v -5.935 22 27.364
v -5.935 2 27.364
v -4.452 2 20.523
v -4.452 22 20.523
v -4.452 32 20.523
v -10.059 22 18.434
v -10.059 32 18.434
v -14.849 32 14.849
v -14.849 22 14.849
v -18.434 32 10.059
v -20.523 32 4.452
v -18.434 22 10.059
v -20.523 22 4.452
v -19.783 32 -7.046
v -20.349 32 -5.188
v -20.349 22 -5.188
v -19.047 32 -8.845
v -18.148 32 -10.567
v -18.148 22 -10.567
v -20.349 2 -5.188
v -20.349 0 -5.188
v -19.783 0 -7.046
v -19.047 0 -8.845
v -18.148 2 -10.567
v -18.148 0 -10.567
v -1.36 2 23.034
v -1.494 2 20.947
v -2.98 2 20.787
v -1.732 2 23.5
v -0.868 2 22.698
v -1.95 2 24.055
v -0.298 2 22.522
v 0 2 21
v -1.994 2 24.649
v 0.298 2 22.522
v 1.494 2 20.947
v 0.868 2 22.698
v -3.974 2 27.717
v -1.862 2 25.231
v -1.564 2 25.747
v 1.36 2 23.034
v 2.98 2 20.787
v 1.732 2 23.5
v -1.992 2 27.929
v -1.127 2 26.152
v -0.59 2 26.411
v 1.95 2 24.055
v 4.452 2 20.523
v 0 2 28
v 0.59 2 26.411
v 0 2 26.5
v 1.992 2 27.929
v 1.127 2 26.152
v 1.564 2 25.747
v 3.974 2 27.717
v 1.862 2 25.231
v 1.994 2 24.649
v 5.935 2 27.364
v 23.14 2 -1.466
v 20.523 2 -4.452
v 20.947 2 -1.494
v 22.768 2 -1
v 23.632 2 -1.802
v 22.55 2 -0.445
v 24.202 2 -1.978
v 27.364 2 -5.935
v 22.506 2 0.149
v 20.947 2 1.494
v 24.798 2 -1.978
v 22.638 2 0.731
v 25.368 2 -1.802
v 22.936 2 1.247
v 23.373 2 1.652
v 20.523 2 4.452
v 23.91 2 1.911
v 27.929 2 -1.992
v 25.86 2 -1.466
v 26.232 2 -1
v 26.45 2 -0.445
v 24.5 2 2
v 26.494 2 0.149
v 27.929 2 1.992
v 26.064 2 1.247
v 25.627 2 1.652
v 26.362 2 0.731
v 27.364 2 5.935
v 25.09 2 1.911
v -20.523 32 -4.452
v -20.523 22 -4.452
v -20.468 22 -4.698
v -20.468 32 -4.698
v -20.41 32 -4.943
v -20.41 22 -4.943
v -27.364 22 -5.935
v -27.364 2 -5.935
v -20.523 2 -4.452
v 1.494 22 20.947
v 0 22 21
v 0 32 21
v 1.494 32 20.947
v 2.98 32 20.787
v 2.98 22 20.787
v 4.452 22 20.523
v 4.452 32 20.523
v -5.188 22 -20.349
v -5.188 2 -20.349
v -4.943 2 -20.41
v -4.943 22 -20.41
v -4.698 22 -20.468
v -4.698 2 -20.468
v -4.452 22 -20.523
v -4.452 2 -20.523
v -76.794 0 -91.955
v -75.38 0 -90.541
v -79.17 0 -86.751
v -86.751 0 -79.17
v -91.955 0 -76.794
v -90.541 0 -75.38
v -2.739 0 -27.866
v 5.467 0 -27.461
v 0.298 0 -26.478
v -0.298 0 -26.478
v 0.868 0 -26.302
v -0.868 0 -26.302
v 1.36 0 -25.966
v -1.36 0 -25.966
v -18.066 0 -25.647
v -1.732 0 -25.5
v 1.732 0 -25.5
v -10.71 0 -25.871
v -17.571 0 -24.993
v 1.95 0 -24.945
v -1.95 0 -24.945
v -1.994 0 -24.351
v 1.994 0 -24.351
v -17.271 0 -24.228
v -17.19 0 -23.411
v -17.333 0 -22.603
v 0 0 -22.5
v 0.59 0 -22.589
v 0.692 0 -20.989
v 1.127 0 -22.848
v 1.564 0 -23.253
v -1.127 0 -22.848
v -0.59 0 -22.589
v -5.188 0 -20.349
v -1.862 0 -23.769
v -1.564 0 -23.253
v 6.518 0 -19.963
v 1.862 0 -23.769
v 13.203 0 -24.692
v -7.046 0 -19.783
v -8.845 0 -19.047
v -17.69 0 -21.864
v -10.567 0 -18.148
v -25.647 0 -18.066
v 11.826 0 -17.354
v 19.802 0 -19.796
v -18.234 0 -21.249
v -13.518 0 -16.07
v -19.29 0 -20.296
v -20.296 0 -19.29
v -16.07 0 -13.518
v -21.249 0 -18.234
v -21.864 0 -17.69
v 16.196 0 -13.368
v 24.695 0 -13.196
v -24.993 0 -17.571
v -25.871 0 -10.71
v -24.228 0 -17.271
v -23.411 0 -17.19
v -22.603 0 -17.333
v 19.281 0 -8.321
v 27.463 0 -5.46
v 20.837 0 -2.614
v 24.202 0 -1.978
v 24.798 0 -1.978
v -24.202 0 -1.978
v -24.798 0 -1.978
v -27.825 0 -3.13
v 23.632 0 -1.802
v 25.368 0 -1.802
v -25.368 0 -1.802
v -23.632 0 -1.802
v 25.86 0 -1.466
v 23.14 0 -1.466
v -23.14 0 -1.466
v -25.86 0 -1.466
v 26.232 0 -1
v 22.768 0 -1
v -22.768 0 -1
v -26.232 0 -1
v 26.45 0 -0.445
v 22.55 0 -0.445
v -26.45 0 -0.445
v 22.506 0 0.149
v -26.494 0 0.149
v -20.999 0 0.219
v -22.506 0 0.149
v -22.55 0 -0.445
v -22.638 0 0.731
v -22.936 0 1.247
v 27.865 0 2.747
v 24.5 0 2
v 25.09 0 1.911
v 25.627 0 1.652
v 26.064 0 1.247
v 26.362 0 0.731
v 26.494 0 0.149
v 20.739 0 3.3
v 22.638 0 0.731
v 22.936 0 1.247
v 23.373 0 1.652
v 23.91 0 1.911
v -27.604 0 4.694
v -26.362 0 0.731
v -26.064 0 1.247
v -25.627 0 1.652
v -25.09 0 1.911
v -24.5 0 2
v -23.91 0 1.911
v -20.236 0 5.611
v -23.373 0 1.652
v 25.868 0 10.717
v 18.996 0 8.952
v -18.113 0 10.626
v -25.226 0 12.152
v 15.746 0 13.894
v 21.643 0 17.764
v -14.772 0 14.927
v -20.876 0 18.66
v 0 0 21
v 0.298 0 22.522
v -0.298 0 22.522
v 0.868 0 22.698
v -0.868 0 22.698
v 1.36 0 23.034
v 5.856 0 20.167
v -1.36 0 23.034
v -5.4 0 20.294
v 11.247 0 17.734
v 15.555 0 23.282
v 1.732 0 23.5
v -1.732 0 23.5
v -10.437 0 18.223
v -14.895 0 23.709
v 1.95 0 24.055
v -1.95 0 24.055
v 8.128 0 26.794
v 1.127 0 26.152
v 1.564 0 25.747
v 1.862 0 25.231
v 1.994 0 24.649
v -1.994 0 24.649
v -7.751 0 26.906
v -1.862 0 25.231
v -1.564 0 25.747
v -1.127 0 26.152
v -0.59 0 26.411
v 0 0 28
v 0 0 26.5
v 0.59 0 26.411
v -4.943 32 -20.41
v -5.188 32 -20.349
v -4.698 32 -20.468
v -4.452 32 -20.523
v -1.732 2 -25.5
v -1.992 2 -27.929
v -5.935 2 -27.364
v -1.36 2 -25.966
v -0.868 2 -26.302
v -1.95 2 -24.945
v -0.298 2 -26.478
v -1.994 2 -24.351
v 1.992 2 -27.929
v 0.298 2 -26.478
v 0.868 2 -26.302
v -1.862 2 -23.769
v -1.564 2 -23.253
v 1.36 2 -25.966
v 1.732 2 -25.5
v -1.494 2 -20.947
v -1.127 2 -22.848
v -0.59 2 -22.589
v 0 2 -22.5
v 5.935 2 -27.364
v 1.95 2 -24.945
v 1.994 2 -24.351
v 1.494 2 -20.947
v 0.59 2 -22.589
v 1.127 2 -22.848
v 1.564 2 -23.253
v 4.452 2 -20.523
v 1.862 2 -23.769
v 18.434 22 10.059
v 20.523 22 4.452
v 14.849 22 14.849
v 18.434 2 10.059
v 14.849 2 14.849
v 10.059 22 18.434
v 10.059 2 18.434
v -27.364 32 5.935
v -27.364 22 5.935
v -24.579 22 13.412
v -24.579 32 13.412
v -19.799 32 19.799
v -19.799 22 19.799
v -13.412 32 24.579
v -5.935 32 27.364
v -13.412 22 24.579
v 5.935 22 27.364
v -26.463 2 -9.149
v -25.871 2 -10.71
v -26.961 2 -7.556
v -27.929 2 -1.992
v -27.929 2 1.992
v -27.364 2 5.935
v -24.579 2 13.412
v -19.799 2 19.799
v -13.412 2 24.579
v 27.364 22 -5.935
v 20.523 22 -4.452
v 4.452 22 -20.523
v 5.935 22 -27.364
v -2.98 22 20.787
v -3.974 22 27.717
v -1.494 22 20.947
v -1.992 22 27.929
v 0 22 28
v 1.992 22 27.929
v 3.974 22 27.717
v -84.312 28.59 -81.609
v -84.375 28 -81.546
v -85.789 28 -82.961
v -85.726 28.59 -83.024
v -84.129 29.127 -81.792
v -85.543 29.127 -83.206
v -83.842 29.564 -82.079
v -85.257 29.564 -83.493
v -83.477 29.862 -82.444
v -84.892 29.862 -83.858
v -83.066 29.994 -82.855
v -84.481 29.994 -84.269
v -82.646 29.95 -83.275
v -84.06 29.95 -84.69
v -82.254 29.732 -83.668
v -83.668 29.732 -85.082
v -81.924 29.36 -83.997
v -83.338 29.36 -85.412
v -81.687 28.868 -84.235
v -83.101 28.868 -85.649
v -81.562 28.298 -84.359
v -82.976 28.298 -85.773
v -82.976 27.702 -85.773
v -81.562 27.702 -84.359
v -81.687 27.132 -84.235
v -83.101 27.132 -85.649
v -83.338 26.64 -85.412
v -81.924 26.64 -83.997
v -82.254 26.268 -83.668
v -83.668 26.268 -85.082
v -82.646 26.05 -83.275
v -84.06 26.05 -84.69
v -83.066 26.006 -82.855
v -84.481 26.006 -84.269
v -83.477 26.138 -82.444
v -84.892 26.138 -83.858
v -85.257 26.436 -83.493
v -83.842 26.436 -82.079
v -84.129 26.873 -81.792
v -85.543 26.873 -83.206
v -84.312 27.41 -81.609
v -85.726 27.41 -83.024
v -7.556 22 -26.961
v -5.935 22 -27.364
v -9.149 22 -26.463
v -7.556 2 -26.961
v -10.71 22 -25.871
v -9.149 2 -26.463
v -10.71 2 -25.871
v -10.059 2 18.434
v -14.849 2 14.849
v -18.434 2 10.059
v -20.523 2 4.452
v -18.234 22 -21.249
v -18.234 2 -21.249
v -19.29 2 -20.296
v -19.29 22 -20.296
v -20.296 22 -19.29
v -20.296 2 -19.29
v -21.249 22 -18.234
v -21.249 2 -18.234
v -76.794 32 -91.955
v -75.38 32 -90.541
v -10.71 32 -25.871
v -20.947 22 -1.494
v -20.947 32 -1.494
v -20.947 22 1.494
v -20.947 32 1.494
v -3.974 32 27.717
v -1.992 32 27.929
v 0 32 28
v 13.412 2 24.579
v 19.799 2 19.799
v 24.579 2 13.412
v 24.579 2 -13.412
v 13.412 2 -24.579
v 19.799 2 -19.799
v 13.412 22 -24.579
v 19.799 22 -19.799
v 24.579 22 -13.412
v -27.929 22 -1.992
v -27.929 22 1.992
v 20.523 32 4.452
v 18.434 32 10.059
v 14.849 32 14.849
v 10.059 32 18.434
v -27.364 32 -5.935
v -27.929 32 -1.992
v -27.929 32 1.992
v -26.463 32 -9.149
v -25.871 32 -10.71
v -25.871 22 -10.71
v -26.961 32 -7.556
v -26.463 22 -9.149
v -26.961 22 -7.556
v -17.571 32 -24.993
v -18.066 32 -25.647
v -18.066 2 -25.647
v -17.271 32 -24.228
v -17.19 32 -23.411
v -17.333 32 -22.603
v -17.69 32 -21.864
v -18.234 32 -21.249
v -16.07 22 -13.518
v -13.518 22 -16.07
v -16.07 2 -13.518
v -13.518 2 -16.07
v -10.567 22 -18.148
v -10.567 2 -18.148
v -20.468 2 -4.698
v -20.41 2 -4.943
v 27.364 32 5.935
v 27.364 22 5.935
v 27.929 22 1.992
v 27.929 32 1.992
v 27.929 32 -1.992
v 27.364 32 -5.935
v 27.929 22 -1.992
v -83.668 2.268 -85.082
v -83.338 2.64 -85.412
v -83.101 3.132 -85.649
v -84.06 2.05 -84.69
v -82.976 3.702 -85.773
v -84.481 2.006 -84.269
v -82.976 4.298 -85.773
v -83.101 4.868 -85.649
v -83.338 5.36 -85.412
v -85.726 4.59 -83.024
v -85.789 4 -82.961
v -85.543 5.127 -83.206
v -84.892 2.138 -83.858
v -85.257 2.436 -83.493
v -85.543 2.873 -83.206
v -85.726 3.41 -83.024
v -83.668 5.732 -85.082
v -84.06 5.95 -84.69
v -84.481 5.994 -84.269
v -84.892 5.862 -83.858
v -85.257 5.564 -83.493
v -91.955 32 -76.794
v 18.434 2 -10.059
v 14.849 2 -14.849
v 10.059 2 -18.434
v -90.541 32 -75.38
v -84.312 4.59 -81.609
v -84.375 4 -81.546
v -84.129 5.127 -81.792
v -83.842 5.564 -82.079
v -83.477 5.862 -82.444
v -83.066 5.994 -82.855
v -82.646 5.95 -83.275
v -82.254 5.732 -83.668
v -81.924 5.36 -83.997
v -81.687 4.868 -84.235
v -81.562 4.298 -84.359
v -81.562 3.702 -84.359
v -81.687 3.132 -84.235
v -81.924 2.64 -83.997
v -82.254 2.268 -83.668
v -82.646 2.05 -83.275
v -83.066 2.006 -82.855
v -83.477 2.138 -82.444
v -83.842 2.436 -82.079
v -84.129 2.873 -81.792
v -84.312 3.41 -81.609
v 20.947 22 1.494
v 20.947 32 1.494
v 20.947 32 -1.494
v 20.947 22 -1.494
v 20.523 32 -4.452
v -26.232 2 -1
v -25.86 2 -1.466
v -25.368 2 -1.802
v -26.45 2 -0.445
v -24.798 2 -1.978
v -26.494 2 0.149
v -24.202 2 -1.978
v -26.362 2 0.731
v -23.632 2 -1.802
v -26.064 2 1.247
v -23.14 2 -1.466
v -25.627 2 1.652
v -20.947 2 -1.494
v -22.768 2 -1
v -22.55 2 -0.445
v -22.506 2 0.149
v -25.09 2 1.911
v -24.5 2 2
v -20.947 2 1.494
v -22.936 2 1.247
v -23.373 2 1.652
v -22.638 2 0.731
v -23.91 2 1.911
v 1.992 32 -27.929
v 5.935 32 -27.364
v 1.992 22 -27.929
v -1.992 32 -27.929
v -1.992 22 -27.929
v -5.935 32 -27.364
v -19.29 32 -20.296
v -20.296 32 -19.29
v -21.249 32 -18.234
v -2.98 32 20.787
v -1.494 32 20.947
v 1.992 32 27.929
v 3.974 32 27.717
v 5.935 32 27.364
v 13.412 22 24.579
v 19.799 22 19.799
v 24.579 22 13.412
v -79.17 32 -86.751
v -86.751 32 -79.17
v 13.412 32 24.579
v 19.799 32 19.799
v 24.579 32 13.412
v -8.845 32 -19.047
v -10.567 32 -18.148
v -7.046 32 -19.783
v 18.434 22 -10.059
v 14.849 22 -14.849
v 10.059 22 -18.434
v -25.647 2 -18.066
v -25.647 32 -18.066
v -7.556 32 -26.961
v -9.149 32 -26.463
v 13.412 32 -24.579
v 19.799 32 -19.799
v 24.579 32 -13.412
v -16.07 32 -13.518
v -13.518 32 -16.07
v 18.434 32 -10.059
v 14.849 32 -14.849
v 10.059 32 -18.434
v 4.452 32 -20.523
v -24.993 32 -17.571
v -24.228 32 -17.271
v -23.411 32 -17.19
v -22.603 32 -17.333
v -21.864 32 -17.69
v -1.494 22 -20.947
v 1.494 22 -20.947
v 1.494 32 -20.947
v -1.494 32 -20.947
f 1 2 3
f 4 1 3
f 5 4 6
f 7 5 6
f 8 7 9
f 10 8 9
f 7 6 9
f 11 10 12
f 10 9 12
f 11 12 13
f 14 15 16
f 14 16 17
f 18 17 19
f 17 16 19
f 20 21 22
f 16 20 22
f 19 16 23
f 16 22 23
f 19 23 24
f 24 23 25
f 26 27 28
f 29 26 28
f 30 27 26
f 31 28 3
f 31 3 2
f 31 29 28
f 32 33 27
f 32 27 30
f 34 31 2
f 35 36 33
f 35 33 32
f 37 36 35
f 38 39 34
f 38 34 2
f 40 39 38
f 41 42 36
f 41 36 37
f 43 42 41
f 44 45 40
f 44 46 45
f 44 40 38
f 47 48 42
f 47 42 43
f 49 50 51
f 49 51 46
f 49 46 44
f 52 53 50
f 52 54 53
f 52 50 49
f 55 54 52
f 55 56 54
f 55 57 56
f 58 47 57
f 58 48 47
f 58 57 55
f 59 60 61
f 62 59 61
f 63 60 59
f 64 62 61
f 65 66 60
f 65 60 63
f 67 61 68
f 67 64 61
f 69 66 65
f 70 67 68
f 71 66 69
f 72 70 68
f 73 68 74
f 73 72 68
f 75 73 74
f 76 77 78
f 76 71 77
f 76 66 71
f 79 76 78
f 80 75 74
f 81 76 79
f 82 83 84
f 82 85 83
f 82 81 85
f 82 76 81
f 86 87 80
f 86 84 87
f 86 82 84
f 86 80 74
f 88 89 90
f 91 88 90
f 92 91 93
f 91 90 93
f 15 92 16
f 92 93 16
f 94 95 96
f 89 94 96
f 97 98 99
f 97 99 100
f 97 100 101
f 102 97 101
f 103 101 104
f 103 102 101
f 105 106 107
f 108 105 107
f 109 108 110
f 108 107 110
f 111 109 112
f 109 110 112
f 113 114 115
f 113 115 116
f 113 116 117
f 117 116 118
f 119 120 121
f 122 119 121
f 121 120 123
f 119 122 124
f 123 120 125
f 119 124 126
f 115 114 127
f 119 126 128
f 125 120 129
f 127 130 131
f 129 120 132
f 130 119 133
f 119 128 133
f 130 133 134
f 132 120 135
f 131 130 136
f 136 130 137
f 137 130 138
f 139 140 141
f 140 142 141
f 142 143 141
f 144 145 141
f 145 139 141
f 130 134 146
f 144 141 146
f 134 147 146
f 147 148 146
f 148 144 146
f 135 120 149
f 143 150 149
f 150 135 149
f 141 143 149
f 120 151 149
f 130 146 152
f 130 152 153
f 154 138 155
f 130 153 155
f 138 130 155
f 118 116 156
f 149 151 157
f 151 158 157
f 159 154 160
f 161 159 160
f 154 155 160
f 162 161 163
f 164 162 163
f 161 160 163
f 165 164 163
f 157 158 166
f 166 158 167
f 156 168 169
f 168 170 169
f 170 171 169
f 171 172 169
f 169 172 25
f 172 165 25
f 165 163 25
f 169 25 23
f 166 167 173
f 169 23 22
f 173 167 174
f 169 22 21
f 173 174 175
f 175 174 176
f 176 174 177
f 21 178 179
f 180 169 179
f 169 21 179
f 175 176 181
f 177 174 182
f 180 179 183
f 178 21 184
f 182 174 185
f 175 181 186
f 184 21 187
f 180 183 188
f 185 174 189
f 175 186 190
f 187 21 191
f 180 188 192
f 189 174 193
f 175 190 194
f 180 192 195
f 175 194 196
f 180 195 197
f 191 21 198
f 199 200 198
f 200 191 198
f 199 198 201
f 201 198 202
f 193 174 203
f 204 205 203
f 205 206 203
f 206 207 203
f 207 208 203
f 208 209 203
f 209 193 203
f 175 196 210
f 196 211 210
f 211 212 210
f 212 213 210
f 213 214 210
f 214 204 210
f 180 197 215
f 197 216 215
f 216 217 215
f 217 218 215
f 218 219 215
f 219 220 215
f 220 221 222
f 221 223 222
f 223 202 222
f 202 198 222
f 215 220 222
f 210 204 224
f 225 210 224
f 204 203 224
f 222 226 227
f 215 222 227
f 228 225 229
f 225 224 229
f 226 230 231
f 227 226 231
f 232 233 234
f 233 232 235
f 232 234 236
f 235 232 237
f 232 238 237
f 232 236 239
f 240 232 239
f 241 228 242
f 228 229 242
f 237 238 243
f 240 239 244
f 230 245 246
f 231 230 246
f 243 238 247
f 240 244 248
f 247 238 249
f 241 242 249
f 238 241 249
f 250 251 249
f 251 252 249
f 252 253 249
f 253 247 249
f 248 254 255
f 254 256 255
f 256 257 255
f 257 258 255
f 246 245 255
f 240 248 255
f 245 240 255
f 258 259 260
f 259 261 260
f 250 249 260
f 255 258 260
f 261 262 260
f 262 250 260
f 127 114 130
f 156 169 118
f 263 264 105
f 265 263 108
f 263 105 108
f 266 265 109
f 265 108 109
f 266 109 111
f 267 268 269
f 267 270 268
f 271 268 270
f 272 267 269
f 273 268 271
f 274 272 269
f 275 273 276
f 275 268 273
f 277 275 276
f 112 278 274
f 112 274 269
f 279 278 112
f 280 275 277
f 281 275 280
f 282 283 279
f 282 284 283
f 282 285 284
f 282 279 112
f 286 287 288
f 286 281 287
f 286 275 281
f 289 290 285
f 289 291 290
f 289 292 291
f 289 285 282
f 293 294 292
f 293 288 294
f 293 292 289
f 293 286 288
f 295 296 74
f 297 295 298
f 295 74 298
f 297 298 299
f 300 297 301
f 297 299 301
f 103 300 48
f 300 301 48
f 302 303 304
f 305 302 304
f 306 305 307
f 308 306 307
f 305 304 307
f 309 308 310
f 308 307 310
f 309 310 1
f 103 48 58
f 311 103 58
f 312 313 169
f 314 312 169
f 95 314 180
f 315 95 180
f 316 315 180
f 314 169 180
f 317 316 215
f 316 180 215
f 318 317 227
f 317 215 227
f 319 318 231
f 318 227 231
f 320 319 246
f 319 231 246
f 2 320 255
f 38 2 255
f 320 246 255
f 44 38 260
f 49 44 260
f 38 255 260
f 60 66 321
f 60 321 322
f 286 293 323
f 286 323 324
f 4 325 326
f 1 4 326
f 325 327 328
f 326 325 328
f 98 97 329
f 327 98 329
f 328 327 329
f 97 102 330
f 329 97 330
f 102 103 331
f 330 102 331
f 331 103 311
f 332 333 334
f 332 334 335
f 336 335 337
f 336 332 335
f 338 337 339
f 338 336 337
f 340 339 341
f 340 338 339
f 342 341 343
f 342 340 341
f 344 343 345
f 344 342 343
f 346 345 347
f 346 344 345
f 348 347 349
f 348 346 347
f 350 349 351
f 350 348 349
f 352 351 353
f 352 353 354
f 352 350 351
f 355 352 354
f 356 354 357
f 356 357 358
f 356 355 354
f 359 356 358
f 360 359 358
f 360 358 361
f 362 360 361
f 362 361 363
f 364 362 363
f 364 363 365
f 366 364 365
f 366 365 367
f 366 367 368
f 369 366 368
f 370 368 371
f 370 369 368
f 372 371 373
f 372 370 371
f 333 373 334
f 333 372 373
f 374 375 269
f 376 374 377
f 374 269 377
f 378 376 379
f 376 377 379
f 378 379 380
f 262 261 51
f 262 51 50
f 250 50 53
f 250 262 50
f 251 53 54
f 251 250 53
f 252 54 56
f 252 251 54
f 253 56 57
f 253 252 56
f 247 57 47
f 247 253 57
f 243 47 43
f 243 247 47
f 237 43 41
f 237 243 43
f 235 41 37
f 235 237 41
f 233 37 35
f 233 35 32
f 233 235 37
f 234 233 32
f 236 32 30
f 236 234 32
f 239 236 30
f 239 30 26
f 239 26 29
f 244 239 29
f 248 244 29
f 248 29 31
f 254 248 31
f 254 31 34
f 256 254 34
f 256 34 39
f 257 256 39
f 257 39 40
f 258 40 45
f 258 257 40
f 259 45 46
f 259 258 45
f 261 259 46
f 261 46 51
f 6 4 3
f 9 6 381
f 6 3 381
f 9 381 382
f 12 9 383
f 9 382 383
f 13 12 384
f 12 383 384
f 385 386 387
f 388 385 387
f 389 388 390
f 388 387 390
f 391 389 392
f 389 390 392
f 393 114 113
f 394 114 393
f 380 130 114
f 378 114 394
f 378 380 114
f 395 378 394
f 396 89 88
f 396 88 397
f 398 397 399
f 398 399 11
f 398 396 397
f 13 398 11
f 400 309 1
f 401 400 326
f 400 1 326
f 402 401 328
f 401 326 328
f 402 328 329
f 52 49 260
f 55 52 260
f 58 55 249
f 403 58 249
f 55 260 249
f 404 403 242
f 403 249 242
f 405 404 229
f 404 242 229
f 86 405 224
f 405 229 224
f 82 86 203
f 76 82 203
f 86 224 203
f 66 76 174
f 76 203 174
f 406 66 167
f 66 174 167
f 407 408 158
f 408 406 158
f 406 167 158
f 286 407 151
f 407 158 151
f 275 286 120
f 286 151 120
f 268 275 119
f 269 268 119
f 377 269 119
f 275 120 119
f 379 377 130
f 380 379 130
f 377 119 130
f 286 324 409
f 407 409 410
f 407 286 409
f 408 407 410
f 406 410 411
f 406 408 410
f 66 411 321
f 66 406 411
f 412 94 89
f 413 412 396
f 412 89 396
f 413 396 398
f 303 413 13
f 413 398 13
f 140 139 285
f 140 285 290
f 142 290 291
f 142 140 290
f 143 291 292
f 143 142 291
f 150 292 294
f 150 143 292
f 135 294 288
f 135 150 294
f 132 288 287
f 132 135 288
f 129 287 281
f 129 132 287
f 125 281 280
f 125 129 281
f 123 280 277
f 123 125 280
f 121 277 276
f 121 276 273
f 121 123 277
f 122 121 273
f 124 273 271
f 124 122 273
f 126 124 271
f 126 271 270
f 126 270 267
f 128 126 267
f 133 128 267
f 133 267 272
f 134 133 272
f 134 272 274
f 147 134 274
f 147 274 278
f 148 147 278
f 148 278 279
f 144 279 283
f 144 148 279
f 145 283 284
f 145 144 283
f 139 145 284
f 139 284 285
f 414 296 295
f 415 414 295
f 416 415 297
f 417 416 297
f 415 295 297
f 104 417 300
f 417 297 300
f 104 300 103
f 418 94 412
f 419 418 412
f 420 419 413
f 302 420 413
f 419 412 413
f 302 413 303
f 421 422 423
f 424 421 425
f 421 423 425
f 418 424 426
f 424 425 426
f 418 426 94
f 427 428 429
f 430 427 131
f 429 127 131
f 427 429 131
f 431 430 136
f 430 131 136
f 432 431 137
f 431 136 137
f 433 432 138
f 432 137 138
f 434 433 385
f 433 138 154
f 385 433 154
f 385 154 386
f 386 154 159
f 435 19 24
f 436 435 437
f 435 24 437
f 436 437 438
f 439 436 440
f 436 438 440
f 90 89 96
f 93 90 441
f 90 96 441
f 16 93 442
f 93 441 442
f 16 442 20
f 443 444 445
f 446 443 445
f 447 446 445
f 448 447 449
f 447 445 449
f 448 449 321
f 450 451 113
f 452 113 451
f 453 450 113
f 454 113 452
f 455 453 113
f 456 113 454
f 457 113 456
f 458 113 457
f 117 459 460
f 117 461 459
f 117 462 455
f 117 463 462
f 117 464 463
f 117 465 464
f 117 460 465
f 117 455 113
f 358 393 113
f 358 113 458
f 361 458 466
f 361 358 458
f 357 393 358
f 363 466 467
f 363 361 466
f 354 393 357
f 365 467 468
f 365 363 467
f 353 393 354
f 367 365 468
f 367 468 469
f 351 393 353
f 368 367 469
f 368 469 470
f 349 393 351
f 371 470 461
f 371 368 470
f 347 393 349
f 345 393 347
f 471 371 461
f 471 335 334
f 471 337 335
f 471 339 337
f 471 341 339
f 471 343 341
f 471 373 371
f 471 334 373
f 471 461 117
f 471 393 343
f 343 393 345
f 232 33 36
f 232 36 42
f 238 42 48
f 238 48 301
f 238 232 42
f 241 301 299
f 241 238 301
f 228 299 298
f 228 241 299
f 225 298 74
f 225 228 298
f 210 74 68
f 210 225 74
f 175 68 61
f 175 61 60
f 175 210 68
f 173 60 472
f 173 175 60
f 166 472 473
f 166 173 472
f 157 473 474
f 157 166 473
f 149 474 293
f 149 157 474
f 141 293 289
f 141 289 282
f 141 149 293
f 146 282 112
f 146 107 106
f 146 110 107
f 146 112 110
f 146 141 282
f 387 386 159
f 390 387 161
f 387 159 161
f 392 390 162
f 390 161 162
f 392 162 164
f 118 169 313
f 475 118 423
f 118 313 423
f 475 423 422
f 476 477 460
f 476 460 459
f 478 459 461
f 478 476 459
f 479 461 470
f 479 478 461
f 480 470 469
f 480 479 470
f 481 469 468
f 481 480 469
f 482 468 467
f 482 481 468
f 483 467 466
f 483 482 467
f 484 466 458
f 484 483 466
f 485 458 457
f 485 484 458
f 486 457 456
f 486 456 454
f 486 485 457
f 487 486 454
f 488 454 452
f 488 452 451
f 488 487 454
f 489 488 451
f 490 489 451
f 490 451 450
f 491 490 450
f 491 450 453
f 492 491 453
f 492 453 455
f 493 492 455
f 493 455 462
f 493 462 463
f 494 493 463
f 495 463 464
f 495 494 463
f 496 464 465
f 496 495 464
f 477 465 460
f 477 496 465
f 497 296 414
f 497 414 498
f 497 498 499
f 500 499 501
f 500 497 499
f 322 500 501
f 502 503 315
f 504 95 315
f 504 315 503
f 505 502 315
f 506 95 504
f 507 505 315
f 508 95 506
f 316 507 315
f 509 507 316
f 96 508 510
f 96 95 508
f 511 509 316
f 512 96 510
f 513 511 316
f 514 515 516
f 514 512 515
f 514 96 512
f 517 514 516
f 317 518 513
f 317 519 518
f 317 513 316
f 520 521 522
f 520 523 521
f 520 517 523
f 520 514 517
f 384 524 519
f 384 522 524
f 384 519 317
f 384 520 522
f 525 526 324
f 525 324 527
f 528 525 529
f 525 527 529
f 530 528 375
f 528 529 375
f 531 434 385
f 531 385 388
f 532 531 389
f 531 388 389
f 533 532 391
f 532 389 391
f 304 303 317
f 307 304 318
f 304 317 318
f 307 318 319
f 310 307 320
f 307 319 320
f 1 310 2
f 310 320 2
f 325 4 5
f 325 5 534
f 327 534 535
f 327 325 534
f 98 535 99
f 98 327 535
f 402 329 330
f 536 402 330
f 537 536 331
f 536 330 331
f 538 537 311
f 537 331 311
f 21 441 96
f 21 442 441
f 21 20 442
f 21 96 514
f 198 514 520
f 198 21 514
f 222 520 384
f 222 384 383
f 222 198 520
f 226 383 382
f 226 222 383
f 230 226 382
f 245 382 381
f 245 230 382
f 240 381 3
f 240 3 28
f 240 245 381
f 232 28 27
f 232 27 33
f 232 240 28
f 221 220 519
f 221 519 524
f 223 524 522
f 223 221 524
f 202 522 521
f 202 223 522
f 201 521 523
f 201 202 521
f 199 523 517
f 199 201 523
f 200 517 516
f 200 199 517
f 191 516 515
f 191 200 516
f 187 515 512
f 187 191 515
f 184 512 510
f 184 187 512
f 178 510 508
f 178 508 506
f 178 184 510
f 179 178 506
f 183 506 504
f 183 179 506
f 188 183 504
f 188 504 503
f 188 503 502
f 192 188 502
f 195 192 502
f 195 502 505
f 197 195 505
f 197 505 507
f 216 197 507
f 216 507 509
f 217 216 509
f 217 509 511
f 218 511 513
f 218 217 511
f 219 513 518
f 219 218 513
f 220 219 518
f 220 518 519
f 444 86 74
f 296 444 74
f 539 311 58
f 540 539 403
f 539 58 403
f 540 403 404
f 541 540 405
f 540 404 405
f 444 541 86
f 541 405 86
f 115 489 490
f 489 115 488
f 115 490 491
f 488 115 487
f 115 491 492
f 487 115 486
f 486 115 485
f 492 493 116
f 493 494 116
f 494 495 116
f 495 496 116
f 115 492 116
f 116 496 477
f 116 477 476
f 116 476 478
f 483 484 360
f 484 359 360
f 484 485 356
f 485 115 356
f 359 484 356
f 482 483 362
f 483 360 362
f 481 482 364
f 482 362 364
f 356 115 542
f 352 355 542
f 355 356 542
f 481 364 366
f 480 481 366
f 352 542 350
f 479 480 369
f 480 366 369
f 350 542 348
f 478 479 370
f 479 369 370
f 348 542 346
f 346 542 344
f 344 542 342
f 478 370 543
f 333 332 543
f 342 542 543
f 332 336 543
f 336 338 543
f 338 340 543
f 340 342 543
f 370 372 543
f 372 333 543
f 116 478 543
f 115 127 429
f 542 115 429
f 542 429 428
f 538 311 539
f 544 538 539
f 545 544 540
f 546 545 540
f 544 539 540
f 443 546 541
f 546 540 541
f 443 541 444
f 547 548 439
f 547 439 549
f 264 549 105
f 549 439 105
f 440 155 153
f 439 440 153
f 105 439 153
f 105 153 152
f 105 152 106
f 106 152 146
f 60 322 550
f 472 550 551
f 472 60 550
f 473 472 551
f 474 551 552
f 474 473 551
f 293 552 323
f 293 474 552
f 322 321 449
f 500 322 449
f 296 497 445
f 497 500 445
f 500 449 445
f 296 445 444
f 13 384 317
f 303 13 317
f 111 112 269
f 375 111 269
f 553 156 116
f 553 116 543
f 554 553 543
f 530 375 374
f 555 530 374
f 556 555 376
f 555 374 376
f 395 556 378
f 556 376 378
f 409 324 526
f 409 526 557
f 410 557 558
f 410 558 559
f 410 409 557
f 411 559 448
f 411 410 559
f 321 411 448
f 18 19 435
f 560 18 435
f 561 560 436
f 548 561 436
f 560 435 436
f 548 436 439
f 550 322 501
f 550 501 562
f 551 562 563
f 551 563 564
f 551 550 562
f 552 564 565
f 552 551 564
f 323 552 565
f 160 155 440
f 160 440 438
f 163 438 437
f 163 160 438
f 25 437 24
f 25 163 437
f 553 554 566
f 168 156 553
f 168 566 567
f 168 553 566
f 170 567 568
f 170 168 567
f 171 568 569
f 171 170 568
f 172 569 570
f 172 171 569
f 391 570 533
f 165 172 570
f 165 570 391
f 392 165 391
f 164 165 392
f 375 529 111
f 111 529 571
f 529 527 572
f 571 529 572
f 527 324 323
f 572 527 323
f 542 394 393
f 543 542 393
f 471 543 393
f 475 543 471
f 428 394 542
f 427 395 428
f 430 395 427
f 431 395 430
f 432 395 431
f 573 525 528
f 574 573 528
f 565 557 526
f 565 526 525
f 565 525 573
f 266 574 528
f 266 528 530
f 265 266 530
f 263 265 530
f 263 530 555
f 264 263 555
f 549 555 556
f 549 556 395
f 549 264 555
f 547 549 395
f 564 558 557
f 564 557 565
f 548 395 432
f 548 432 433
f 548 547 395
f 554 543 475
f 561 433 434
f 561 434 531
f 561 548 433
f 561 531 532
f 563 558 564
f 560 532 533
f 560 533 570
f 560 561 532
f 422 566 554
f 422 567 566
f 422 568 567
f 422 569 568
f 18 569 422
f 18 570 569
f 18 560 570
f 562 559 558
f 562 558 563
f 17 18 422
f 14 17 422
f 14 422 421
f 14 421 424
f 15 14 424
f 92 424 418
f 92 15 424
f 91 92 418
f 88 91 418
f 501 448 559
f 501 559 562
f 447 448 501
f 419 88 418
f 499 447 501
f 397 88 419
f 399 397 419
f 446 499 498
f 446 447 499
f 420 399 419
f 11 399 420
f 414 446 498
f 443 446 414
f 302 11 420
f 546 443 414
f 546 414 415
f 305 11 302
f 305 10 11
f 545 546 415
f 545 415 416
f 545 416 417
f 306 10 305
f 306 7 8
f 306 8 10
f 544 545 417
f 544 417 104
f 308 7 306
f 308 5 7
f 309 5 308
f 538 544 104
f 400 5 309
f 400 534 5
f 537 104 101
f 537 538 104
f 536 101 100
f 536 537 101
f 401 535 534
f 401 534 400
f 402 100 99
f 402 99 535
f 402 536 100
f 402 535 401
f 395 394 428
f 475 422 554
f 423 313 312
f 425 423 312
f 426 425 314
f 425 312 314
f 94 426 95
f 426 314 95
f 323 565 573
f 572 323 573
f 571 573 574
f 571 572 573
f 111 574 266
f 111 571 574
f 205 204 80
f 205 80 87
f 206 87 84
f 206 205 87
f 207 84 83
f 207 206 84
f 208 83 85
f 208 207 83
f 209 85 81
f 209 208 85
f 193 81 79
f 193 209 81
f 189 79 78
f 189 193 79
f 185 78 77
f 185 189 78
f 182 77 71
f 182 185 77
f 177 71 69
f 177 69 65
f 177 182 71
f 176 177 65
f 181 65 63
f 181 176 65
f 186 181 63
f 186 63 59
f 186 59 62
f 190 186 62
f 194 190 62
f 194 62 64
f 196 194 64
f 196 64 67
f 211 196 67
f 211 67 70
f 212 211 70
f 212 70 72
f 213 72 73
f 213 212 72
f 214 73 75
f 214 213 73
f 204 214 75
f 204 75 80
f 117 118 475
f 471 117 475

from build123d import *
from build123d.topology import SkipClean

# Parameters (mm, degrees)
SKETCH_1_R          = 28
SKETCH_1_R_2        = 2
SKETCH_1_R_3        = 21
EXTRUDE_1_DEPTH     = 2
EXTRUDE_3_DEPTH     = 30
EXTRUDE_START       = -10
SKETCH_5_R          = 28
SKETCH_5_R_2        = 21
EXTRUDE_4_DEPTH     = 10
SKETCH_6_W          = 5.360290559
SKETCH_6_H          = 32
EXTRUDE_6_DEPTH     = 100
SKETCH_9_R          = 21
CUT_EXTRUDE_1_DEPTH = 32
SKETCH_11_W         = 21.441162236
SKETCH_11_H         = 32
SKETCH_11_R         = 2
EXTRUDE_7_DEPTH     = 2
FILLET_1_R          = 3


with BuildPart() as part:
    # 草图1 → 凸台-拉伸1 (new body)
    with BuildSketch(Plane(origin=(0, 0, 0), x_dir=(1, 0, 0), z_dir=(0, 1, 0))):
        with Locations(Location((0, 0, 0), (0, 0, 270))):
            Circle(SKETCH_1_R)
        with Locations(Location((-24.5, 0, 0), (0, 0, 270))):
            Circle(SKETCH_1_R_2, mode=Mode.SUBTRACT)
        with Locations(Location((0, 24.5, 0), (0, 0, 270))):
            Circle(SKETCH_1_R_2, mode=Mode.SUBTRACT)
        with Locations(Location((24.5, 0, 0), (0, 0, 270))):
            Circle(SKETCH_1_R_2, mode=Mode.SUBTRACT)
        with Locations(Location((0, -24.5, 0), (0, 0, 270))):
            Circle(SKETCH_1_R_2, mode=Mode.SUBTRACT)
        with Locations(Location((0, 0, 0), (0, 0, 270))):
            Circle(SKETCH_1_R_3, mode=Mode.SUBTRACT)
    extrude(amount=EXTRUDE_1_DEPTH)

    # 草图2 → 凸台-拉伸3 (add)
    with SkipClean():  # the faces are left unmerged after this step: merging them gives an invalid solid
        with BuildSketch(Plane(origin=(0, 2, 0), x_dir=(1, 0, 0), z_dir=(0, 1, 0))):
            with BuildLine():
                ThreePointArc((-20.522761723, 4.451544819), (-14.849242405, 14.849242405), (-4.451544819, 20.522761723))
                Line((-4.451544819, 20.522761723), (-5.935393092, 27.363682297))
                ThreePointArc((-5.935393092, 27.363682297), (-19.798989873, 19.798989873), (-27.363682297, 5.935393092))
                Line((-27.363682297, 5.935393092), (-20.522761723, 4.451544819))
            make_face()
            with BuildLine():
                ThreePointArc((5.935393092, -27.363682297), (19.798989873, -19.798989873), (27.363682297, -5.935393092))
                Line((27.363682297, -5.935393092), (20.522761723, -4.451544819))
                ThreePointArc((20.522761723, -4.451544819), (14.849242405, -14.849242405), (4.451544819, -20.522761723))
                Line((4.451544819, -20.522761723), (5.935393092, -27.363682297))
            make_face()
            with BuildLine():
                ThreePointArc((-4.451544819, -20.522761723), (-14.849242405, -14.849242405), (-20.522761723, -4.451544819))
                Line((-20.522761723, -4.451544819), (-27.363682297, -5.935393092))
                ThreePointArc((-27.363682297, -5.935393092), (-19.798989873, -19.798989873), (-5.935393092, -27.363682297))
                Line((-5.935393092, -27.363682297), (-4.451544819, -20.522761723))
            make_face()
            with BuildLine():
                Line((4.451544819, 20.522761723), (5.935393092, 27.363682297))
                ThreePointArc((5.935393092, 27.363682297), (19.798989873, 19.798989873), (27.363682297, 5.935393092))
                Line((27.363682297, 5.935393092), (20.522761723, 4.451544819))
                ThreePointArc((20.522761723, 4.451544819), (14.849242405, 14.849242405), (4.451544819, 20.522761723))
            make_face()
        extrude(amount=EXTRUDE_3_DEPTH)

    # 草图5 → 凸台-拉伸4 (add)
    with SkipClean():  # the faces are left unmerged after this step: merging them gives an invalid solid
        with BuildSketch(Plane(origin=(0, 32, 0), x_dir=(1, 0, 0), z_dir=(0, 1, 0)).offset(EXTRUDE_START)):
            with Locations(Location((0, 0, 0), (0, 0, 270))):
                Circle(SKETCH_5_R)
            with Locations(Location((0, 0, 0), (0, 0, 270))):
                Circle(SKETCH_5_R_2, mode=Mode.SUBTRACT)
        extrude(amount=EXTRUDE_4_DEPTH)

    # 草图6 → 凸台-拉伸6 (add)
    with SkipClean():  # the faces are left unmerged after this step: merging them gives an invalid solid
        with BuildSketch(Plane(origin=(-12.25, 0, -12.25), x_dir=(-0.7071067811865488, 0, 0.7071067811865462), z_dir=(-0.7071067811865462, 0, -0.7071067811865488))):
            with Locations((-8.040435839, 16)):
                Rectangle(SKETCH_6_W, SKETCH_6_H)
            with Locations((8.040435839, 16)):
                Rectangle(SKETCH_6_W, SKETCH_6_H)
        extrude(amount=EXTRUDE_6_DEPTH)

    # 草图9 → 切除-拉伸1 (cut)
    with SkipClean():  # the faces are left unmerged after this step: merging them gives an invalid solid
        with BuildSketch(Plane.XZ):
            with Locations(Location((0, 0, 0), (0, 0, 90))):
                Circle(SKETCH_9_R)
        extrude(amount=-CUT_EXTRUDE_1_DEPTH, mode=Mode.SUBTRACT)
    add(part.part.scale(1), mode=Mode.REPLACE)  # the faces are merged on a copy

    # 草图11 → 凸台-拉伸7 (add)
    with SkipClean():  # the faces are left unmerged after this step: merging them gives an invalid solid
        with BuildSketch(Plane(origin=(-82.960678119, 0, -82.960678119), x_dir=(-0.7071067811865488, 0, 0.7071067811865462), z_dir=(-0.7071067811865462, 0, -0.7071067811865488))):
            with Locations((0, 16)):
                Rectangle(SKETCH_11_W, SKETCH_11_H)
            with Locations((0, 4)):
                Circle(SKETCH_11_R, mode=Mode.SUBTRACT)
            with Locations((0, 28)):
                Circle(SKETCH_11_R, mode=Mode.SUBTRACT)
        extrude(amount=EXTRUDE_7_DEPTH)

    # 圆角1
    fillet_1_edges = [part.edges().sort_by_distance(p)[0] for p in [
        (-15.642500311, 12, -23.223095918),
        (-23.223095918, 12, -15.642500311),
    ]]
    fillet(fillet_1_edges, radius=FILLET_1_R)


solid = part.part
